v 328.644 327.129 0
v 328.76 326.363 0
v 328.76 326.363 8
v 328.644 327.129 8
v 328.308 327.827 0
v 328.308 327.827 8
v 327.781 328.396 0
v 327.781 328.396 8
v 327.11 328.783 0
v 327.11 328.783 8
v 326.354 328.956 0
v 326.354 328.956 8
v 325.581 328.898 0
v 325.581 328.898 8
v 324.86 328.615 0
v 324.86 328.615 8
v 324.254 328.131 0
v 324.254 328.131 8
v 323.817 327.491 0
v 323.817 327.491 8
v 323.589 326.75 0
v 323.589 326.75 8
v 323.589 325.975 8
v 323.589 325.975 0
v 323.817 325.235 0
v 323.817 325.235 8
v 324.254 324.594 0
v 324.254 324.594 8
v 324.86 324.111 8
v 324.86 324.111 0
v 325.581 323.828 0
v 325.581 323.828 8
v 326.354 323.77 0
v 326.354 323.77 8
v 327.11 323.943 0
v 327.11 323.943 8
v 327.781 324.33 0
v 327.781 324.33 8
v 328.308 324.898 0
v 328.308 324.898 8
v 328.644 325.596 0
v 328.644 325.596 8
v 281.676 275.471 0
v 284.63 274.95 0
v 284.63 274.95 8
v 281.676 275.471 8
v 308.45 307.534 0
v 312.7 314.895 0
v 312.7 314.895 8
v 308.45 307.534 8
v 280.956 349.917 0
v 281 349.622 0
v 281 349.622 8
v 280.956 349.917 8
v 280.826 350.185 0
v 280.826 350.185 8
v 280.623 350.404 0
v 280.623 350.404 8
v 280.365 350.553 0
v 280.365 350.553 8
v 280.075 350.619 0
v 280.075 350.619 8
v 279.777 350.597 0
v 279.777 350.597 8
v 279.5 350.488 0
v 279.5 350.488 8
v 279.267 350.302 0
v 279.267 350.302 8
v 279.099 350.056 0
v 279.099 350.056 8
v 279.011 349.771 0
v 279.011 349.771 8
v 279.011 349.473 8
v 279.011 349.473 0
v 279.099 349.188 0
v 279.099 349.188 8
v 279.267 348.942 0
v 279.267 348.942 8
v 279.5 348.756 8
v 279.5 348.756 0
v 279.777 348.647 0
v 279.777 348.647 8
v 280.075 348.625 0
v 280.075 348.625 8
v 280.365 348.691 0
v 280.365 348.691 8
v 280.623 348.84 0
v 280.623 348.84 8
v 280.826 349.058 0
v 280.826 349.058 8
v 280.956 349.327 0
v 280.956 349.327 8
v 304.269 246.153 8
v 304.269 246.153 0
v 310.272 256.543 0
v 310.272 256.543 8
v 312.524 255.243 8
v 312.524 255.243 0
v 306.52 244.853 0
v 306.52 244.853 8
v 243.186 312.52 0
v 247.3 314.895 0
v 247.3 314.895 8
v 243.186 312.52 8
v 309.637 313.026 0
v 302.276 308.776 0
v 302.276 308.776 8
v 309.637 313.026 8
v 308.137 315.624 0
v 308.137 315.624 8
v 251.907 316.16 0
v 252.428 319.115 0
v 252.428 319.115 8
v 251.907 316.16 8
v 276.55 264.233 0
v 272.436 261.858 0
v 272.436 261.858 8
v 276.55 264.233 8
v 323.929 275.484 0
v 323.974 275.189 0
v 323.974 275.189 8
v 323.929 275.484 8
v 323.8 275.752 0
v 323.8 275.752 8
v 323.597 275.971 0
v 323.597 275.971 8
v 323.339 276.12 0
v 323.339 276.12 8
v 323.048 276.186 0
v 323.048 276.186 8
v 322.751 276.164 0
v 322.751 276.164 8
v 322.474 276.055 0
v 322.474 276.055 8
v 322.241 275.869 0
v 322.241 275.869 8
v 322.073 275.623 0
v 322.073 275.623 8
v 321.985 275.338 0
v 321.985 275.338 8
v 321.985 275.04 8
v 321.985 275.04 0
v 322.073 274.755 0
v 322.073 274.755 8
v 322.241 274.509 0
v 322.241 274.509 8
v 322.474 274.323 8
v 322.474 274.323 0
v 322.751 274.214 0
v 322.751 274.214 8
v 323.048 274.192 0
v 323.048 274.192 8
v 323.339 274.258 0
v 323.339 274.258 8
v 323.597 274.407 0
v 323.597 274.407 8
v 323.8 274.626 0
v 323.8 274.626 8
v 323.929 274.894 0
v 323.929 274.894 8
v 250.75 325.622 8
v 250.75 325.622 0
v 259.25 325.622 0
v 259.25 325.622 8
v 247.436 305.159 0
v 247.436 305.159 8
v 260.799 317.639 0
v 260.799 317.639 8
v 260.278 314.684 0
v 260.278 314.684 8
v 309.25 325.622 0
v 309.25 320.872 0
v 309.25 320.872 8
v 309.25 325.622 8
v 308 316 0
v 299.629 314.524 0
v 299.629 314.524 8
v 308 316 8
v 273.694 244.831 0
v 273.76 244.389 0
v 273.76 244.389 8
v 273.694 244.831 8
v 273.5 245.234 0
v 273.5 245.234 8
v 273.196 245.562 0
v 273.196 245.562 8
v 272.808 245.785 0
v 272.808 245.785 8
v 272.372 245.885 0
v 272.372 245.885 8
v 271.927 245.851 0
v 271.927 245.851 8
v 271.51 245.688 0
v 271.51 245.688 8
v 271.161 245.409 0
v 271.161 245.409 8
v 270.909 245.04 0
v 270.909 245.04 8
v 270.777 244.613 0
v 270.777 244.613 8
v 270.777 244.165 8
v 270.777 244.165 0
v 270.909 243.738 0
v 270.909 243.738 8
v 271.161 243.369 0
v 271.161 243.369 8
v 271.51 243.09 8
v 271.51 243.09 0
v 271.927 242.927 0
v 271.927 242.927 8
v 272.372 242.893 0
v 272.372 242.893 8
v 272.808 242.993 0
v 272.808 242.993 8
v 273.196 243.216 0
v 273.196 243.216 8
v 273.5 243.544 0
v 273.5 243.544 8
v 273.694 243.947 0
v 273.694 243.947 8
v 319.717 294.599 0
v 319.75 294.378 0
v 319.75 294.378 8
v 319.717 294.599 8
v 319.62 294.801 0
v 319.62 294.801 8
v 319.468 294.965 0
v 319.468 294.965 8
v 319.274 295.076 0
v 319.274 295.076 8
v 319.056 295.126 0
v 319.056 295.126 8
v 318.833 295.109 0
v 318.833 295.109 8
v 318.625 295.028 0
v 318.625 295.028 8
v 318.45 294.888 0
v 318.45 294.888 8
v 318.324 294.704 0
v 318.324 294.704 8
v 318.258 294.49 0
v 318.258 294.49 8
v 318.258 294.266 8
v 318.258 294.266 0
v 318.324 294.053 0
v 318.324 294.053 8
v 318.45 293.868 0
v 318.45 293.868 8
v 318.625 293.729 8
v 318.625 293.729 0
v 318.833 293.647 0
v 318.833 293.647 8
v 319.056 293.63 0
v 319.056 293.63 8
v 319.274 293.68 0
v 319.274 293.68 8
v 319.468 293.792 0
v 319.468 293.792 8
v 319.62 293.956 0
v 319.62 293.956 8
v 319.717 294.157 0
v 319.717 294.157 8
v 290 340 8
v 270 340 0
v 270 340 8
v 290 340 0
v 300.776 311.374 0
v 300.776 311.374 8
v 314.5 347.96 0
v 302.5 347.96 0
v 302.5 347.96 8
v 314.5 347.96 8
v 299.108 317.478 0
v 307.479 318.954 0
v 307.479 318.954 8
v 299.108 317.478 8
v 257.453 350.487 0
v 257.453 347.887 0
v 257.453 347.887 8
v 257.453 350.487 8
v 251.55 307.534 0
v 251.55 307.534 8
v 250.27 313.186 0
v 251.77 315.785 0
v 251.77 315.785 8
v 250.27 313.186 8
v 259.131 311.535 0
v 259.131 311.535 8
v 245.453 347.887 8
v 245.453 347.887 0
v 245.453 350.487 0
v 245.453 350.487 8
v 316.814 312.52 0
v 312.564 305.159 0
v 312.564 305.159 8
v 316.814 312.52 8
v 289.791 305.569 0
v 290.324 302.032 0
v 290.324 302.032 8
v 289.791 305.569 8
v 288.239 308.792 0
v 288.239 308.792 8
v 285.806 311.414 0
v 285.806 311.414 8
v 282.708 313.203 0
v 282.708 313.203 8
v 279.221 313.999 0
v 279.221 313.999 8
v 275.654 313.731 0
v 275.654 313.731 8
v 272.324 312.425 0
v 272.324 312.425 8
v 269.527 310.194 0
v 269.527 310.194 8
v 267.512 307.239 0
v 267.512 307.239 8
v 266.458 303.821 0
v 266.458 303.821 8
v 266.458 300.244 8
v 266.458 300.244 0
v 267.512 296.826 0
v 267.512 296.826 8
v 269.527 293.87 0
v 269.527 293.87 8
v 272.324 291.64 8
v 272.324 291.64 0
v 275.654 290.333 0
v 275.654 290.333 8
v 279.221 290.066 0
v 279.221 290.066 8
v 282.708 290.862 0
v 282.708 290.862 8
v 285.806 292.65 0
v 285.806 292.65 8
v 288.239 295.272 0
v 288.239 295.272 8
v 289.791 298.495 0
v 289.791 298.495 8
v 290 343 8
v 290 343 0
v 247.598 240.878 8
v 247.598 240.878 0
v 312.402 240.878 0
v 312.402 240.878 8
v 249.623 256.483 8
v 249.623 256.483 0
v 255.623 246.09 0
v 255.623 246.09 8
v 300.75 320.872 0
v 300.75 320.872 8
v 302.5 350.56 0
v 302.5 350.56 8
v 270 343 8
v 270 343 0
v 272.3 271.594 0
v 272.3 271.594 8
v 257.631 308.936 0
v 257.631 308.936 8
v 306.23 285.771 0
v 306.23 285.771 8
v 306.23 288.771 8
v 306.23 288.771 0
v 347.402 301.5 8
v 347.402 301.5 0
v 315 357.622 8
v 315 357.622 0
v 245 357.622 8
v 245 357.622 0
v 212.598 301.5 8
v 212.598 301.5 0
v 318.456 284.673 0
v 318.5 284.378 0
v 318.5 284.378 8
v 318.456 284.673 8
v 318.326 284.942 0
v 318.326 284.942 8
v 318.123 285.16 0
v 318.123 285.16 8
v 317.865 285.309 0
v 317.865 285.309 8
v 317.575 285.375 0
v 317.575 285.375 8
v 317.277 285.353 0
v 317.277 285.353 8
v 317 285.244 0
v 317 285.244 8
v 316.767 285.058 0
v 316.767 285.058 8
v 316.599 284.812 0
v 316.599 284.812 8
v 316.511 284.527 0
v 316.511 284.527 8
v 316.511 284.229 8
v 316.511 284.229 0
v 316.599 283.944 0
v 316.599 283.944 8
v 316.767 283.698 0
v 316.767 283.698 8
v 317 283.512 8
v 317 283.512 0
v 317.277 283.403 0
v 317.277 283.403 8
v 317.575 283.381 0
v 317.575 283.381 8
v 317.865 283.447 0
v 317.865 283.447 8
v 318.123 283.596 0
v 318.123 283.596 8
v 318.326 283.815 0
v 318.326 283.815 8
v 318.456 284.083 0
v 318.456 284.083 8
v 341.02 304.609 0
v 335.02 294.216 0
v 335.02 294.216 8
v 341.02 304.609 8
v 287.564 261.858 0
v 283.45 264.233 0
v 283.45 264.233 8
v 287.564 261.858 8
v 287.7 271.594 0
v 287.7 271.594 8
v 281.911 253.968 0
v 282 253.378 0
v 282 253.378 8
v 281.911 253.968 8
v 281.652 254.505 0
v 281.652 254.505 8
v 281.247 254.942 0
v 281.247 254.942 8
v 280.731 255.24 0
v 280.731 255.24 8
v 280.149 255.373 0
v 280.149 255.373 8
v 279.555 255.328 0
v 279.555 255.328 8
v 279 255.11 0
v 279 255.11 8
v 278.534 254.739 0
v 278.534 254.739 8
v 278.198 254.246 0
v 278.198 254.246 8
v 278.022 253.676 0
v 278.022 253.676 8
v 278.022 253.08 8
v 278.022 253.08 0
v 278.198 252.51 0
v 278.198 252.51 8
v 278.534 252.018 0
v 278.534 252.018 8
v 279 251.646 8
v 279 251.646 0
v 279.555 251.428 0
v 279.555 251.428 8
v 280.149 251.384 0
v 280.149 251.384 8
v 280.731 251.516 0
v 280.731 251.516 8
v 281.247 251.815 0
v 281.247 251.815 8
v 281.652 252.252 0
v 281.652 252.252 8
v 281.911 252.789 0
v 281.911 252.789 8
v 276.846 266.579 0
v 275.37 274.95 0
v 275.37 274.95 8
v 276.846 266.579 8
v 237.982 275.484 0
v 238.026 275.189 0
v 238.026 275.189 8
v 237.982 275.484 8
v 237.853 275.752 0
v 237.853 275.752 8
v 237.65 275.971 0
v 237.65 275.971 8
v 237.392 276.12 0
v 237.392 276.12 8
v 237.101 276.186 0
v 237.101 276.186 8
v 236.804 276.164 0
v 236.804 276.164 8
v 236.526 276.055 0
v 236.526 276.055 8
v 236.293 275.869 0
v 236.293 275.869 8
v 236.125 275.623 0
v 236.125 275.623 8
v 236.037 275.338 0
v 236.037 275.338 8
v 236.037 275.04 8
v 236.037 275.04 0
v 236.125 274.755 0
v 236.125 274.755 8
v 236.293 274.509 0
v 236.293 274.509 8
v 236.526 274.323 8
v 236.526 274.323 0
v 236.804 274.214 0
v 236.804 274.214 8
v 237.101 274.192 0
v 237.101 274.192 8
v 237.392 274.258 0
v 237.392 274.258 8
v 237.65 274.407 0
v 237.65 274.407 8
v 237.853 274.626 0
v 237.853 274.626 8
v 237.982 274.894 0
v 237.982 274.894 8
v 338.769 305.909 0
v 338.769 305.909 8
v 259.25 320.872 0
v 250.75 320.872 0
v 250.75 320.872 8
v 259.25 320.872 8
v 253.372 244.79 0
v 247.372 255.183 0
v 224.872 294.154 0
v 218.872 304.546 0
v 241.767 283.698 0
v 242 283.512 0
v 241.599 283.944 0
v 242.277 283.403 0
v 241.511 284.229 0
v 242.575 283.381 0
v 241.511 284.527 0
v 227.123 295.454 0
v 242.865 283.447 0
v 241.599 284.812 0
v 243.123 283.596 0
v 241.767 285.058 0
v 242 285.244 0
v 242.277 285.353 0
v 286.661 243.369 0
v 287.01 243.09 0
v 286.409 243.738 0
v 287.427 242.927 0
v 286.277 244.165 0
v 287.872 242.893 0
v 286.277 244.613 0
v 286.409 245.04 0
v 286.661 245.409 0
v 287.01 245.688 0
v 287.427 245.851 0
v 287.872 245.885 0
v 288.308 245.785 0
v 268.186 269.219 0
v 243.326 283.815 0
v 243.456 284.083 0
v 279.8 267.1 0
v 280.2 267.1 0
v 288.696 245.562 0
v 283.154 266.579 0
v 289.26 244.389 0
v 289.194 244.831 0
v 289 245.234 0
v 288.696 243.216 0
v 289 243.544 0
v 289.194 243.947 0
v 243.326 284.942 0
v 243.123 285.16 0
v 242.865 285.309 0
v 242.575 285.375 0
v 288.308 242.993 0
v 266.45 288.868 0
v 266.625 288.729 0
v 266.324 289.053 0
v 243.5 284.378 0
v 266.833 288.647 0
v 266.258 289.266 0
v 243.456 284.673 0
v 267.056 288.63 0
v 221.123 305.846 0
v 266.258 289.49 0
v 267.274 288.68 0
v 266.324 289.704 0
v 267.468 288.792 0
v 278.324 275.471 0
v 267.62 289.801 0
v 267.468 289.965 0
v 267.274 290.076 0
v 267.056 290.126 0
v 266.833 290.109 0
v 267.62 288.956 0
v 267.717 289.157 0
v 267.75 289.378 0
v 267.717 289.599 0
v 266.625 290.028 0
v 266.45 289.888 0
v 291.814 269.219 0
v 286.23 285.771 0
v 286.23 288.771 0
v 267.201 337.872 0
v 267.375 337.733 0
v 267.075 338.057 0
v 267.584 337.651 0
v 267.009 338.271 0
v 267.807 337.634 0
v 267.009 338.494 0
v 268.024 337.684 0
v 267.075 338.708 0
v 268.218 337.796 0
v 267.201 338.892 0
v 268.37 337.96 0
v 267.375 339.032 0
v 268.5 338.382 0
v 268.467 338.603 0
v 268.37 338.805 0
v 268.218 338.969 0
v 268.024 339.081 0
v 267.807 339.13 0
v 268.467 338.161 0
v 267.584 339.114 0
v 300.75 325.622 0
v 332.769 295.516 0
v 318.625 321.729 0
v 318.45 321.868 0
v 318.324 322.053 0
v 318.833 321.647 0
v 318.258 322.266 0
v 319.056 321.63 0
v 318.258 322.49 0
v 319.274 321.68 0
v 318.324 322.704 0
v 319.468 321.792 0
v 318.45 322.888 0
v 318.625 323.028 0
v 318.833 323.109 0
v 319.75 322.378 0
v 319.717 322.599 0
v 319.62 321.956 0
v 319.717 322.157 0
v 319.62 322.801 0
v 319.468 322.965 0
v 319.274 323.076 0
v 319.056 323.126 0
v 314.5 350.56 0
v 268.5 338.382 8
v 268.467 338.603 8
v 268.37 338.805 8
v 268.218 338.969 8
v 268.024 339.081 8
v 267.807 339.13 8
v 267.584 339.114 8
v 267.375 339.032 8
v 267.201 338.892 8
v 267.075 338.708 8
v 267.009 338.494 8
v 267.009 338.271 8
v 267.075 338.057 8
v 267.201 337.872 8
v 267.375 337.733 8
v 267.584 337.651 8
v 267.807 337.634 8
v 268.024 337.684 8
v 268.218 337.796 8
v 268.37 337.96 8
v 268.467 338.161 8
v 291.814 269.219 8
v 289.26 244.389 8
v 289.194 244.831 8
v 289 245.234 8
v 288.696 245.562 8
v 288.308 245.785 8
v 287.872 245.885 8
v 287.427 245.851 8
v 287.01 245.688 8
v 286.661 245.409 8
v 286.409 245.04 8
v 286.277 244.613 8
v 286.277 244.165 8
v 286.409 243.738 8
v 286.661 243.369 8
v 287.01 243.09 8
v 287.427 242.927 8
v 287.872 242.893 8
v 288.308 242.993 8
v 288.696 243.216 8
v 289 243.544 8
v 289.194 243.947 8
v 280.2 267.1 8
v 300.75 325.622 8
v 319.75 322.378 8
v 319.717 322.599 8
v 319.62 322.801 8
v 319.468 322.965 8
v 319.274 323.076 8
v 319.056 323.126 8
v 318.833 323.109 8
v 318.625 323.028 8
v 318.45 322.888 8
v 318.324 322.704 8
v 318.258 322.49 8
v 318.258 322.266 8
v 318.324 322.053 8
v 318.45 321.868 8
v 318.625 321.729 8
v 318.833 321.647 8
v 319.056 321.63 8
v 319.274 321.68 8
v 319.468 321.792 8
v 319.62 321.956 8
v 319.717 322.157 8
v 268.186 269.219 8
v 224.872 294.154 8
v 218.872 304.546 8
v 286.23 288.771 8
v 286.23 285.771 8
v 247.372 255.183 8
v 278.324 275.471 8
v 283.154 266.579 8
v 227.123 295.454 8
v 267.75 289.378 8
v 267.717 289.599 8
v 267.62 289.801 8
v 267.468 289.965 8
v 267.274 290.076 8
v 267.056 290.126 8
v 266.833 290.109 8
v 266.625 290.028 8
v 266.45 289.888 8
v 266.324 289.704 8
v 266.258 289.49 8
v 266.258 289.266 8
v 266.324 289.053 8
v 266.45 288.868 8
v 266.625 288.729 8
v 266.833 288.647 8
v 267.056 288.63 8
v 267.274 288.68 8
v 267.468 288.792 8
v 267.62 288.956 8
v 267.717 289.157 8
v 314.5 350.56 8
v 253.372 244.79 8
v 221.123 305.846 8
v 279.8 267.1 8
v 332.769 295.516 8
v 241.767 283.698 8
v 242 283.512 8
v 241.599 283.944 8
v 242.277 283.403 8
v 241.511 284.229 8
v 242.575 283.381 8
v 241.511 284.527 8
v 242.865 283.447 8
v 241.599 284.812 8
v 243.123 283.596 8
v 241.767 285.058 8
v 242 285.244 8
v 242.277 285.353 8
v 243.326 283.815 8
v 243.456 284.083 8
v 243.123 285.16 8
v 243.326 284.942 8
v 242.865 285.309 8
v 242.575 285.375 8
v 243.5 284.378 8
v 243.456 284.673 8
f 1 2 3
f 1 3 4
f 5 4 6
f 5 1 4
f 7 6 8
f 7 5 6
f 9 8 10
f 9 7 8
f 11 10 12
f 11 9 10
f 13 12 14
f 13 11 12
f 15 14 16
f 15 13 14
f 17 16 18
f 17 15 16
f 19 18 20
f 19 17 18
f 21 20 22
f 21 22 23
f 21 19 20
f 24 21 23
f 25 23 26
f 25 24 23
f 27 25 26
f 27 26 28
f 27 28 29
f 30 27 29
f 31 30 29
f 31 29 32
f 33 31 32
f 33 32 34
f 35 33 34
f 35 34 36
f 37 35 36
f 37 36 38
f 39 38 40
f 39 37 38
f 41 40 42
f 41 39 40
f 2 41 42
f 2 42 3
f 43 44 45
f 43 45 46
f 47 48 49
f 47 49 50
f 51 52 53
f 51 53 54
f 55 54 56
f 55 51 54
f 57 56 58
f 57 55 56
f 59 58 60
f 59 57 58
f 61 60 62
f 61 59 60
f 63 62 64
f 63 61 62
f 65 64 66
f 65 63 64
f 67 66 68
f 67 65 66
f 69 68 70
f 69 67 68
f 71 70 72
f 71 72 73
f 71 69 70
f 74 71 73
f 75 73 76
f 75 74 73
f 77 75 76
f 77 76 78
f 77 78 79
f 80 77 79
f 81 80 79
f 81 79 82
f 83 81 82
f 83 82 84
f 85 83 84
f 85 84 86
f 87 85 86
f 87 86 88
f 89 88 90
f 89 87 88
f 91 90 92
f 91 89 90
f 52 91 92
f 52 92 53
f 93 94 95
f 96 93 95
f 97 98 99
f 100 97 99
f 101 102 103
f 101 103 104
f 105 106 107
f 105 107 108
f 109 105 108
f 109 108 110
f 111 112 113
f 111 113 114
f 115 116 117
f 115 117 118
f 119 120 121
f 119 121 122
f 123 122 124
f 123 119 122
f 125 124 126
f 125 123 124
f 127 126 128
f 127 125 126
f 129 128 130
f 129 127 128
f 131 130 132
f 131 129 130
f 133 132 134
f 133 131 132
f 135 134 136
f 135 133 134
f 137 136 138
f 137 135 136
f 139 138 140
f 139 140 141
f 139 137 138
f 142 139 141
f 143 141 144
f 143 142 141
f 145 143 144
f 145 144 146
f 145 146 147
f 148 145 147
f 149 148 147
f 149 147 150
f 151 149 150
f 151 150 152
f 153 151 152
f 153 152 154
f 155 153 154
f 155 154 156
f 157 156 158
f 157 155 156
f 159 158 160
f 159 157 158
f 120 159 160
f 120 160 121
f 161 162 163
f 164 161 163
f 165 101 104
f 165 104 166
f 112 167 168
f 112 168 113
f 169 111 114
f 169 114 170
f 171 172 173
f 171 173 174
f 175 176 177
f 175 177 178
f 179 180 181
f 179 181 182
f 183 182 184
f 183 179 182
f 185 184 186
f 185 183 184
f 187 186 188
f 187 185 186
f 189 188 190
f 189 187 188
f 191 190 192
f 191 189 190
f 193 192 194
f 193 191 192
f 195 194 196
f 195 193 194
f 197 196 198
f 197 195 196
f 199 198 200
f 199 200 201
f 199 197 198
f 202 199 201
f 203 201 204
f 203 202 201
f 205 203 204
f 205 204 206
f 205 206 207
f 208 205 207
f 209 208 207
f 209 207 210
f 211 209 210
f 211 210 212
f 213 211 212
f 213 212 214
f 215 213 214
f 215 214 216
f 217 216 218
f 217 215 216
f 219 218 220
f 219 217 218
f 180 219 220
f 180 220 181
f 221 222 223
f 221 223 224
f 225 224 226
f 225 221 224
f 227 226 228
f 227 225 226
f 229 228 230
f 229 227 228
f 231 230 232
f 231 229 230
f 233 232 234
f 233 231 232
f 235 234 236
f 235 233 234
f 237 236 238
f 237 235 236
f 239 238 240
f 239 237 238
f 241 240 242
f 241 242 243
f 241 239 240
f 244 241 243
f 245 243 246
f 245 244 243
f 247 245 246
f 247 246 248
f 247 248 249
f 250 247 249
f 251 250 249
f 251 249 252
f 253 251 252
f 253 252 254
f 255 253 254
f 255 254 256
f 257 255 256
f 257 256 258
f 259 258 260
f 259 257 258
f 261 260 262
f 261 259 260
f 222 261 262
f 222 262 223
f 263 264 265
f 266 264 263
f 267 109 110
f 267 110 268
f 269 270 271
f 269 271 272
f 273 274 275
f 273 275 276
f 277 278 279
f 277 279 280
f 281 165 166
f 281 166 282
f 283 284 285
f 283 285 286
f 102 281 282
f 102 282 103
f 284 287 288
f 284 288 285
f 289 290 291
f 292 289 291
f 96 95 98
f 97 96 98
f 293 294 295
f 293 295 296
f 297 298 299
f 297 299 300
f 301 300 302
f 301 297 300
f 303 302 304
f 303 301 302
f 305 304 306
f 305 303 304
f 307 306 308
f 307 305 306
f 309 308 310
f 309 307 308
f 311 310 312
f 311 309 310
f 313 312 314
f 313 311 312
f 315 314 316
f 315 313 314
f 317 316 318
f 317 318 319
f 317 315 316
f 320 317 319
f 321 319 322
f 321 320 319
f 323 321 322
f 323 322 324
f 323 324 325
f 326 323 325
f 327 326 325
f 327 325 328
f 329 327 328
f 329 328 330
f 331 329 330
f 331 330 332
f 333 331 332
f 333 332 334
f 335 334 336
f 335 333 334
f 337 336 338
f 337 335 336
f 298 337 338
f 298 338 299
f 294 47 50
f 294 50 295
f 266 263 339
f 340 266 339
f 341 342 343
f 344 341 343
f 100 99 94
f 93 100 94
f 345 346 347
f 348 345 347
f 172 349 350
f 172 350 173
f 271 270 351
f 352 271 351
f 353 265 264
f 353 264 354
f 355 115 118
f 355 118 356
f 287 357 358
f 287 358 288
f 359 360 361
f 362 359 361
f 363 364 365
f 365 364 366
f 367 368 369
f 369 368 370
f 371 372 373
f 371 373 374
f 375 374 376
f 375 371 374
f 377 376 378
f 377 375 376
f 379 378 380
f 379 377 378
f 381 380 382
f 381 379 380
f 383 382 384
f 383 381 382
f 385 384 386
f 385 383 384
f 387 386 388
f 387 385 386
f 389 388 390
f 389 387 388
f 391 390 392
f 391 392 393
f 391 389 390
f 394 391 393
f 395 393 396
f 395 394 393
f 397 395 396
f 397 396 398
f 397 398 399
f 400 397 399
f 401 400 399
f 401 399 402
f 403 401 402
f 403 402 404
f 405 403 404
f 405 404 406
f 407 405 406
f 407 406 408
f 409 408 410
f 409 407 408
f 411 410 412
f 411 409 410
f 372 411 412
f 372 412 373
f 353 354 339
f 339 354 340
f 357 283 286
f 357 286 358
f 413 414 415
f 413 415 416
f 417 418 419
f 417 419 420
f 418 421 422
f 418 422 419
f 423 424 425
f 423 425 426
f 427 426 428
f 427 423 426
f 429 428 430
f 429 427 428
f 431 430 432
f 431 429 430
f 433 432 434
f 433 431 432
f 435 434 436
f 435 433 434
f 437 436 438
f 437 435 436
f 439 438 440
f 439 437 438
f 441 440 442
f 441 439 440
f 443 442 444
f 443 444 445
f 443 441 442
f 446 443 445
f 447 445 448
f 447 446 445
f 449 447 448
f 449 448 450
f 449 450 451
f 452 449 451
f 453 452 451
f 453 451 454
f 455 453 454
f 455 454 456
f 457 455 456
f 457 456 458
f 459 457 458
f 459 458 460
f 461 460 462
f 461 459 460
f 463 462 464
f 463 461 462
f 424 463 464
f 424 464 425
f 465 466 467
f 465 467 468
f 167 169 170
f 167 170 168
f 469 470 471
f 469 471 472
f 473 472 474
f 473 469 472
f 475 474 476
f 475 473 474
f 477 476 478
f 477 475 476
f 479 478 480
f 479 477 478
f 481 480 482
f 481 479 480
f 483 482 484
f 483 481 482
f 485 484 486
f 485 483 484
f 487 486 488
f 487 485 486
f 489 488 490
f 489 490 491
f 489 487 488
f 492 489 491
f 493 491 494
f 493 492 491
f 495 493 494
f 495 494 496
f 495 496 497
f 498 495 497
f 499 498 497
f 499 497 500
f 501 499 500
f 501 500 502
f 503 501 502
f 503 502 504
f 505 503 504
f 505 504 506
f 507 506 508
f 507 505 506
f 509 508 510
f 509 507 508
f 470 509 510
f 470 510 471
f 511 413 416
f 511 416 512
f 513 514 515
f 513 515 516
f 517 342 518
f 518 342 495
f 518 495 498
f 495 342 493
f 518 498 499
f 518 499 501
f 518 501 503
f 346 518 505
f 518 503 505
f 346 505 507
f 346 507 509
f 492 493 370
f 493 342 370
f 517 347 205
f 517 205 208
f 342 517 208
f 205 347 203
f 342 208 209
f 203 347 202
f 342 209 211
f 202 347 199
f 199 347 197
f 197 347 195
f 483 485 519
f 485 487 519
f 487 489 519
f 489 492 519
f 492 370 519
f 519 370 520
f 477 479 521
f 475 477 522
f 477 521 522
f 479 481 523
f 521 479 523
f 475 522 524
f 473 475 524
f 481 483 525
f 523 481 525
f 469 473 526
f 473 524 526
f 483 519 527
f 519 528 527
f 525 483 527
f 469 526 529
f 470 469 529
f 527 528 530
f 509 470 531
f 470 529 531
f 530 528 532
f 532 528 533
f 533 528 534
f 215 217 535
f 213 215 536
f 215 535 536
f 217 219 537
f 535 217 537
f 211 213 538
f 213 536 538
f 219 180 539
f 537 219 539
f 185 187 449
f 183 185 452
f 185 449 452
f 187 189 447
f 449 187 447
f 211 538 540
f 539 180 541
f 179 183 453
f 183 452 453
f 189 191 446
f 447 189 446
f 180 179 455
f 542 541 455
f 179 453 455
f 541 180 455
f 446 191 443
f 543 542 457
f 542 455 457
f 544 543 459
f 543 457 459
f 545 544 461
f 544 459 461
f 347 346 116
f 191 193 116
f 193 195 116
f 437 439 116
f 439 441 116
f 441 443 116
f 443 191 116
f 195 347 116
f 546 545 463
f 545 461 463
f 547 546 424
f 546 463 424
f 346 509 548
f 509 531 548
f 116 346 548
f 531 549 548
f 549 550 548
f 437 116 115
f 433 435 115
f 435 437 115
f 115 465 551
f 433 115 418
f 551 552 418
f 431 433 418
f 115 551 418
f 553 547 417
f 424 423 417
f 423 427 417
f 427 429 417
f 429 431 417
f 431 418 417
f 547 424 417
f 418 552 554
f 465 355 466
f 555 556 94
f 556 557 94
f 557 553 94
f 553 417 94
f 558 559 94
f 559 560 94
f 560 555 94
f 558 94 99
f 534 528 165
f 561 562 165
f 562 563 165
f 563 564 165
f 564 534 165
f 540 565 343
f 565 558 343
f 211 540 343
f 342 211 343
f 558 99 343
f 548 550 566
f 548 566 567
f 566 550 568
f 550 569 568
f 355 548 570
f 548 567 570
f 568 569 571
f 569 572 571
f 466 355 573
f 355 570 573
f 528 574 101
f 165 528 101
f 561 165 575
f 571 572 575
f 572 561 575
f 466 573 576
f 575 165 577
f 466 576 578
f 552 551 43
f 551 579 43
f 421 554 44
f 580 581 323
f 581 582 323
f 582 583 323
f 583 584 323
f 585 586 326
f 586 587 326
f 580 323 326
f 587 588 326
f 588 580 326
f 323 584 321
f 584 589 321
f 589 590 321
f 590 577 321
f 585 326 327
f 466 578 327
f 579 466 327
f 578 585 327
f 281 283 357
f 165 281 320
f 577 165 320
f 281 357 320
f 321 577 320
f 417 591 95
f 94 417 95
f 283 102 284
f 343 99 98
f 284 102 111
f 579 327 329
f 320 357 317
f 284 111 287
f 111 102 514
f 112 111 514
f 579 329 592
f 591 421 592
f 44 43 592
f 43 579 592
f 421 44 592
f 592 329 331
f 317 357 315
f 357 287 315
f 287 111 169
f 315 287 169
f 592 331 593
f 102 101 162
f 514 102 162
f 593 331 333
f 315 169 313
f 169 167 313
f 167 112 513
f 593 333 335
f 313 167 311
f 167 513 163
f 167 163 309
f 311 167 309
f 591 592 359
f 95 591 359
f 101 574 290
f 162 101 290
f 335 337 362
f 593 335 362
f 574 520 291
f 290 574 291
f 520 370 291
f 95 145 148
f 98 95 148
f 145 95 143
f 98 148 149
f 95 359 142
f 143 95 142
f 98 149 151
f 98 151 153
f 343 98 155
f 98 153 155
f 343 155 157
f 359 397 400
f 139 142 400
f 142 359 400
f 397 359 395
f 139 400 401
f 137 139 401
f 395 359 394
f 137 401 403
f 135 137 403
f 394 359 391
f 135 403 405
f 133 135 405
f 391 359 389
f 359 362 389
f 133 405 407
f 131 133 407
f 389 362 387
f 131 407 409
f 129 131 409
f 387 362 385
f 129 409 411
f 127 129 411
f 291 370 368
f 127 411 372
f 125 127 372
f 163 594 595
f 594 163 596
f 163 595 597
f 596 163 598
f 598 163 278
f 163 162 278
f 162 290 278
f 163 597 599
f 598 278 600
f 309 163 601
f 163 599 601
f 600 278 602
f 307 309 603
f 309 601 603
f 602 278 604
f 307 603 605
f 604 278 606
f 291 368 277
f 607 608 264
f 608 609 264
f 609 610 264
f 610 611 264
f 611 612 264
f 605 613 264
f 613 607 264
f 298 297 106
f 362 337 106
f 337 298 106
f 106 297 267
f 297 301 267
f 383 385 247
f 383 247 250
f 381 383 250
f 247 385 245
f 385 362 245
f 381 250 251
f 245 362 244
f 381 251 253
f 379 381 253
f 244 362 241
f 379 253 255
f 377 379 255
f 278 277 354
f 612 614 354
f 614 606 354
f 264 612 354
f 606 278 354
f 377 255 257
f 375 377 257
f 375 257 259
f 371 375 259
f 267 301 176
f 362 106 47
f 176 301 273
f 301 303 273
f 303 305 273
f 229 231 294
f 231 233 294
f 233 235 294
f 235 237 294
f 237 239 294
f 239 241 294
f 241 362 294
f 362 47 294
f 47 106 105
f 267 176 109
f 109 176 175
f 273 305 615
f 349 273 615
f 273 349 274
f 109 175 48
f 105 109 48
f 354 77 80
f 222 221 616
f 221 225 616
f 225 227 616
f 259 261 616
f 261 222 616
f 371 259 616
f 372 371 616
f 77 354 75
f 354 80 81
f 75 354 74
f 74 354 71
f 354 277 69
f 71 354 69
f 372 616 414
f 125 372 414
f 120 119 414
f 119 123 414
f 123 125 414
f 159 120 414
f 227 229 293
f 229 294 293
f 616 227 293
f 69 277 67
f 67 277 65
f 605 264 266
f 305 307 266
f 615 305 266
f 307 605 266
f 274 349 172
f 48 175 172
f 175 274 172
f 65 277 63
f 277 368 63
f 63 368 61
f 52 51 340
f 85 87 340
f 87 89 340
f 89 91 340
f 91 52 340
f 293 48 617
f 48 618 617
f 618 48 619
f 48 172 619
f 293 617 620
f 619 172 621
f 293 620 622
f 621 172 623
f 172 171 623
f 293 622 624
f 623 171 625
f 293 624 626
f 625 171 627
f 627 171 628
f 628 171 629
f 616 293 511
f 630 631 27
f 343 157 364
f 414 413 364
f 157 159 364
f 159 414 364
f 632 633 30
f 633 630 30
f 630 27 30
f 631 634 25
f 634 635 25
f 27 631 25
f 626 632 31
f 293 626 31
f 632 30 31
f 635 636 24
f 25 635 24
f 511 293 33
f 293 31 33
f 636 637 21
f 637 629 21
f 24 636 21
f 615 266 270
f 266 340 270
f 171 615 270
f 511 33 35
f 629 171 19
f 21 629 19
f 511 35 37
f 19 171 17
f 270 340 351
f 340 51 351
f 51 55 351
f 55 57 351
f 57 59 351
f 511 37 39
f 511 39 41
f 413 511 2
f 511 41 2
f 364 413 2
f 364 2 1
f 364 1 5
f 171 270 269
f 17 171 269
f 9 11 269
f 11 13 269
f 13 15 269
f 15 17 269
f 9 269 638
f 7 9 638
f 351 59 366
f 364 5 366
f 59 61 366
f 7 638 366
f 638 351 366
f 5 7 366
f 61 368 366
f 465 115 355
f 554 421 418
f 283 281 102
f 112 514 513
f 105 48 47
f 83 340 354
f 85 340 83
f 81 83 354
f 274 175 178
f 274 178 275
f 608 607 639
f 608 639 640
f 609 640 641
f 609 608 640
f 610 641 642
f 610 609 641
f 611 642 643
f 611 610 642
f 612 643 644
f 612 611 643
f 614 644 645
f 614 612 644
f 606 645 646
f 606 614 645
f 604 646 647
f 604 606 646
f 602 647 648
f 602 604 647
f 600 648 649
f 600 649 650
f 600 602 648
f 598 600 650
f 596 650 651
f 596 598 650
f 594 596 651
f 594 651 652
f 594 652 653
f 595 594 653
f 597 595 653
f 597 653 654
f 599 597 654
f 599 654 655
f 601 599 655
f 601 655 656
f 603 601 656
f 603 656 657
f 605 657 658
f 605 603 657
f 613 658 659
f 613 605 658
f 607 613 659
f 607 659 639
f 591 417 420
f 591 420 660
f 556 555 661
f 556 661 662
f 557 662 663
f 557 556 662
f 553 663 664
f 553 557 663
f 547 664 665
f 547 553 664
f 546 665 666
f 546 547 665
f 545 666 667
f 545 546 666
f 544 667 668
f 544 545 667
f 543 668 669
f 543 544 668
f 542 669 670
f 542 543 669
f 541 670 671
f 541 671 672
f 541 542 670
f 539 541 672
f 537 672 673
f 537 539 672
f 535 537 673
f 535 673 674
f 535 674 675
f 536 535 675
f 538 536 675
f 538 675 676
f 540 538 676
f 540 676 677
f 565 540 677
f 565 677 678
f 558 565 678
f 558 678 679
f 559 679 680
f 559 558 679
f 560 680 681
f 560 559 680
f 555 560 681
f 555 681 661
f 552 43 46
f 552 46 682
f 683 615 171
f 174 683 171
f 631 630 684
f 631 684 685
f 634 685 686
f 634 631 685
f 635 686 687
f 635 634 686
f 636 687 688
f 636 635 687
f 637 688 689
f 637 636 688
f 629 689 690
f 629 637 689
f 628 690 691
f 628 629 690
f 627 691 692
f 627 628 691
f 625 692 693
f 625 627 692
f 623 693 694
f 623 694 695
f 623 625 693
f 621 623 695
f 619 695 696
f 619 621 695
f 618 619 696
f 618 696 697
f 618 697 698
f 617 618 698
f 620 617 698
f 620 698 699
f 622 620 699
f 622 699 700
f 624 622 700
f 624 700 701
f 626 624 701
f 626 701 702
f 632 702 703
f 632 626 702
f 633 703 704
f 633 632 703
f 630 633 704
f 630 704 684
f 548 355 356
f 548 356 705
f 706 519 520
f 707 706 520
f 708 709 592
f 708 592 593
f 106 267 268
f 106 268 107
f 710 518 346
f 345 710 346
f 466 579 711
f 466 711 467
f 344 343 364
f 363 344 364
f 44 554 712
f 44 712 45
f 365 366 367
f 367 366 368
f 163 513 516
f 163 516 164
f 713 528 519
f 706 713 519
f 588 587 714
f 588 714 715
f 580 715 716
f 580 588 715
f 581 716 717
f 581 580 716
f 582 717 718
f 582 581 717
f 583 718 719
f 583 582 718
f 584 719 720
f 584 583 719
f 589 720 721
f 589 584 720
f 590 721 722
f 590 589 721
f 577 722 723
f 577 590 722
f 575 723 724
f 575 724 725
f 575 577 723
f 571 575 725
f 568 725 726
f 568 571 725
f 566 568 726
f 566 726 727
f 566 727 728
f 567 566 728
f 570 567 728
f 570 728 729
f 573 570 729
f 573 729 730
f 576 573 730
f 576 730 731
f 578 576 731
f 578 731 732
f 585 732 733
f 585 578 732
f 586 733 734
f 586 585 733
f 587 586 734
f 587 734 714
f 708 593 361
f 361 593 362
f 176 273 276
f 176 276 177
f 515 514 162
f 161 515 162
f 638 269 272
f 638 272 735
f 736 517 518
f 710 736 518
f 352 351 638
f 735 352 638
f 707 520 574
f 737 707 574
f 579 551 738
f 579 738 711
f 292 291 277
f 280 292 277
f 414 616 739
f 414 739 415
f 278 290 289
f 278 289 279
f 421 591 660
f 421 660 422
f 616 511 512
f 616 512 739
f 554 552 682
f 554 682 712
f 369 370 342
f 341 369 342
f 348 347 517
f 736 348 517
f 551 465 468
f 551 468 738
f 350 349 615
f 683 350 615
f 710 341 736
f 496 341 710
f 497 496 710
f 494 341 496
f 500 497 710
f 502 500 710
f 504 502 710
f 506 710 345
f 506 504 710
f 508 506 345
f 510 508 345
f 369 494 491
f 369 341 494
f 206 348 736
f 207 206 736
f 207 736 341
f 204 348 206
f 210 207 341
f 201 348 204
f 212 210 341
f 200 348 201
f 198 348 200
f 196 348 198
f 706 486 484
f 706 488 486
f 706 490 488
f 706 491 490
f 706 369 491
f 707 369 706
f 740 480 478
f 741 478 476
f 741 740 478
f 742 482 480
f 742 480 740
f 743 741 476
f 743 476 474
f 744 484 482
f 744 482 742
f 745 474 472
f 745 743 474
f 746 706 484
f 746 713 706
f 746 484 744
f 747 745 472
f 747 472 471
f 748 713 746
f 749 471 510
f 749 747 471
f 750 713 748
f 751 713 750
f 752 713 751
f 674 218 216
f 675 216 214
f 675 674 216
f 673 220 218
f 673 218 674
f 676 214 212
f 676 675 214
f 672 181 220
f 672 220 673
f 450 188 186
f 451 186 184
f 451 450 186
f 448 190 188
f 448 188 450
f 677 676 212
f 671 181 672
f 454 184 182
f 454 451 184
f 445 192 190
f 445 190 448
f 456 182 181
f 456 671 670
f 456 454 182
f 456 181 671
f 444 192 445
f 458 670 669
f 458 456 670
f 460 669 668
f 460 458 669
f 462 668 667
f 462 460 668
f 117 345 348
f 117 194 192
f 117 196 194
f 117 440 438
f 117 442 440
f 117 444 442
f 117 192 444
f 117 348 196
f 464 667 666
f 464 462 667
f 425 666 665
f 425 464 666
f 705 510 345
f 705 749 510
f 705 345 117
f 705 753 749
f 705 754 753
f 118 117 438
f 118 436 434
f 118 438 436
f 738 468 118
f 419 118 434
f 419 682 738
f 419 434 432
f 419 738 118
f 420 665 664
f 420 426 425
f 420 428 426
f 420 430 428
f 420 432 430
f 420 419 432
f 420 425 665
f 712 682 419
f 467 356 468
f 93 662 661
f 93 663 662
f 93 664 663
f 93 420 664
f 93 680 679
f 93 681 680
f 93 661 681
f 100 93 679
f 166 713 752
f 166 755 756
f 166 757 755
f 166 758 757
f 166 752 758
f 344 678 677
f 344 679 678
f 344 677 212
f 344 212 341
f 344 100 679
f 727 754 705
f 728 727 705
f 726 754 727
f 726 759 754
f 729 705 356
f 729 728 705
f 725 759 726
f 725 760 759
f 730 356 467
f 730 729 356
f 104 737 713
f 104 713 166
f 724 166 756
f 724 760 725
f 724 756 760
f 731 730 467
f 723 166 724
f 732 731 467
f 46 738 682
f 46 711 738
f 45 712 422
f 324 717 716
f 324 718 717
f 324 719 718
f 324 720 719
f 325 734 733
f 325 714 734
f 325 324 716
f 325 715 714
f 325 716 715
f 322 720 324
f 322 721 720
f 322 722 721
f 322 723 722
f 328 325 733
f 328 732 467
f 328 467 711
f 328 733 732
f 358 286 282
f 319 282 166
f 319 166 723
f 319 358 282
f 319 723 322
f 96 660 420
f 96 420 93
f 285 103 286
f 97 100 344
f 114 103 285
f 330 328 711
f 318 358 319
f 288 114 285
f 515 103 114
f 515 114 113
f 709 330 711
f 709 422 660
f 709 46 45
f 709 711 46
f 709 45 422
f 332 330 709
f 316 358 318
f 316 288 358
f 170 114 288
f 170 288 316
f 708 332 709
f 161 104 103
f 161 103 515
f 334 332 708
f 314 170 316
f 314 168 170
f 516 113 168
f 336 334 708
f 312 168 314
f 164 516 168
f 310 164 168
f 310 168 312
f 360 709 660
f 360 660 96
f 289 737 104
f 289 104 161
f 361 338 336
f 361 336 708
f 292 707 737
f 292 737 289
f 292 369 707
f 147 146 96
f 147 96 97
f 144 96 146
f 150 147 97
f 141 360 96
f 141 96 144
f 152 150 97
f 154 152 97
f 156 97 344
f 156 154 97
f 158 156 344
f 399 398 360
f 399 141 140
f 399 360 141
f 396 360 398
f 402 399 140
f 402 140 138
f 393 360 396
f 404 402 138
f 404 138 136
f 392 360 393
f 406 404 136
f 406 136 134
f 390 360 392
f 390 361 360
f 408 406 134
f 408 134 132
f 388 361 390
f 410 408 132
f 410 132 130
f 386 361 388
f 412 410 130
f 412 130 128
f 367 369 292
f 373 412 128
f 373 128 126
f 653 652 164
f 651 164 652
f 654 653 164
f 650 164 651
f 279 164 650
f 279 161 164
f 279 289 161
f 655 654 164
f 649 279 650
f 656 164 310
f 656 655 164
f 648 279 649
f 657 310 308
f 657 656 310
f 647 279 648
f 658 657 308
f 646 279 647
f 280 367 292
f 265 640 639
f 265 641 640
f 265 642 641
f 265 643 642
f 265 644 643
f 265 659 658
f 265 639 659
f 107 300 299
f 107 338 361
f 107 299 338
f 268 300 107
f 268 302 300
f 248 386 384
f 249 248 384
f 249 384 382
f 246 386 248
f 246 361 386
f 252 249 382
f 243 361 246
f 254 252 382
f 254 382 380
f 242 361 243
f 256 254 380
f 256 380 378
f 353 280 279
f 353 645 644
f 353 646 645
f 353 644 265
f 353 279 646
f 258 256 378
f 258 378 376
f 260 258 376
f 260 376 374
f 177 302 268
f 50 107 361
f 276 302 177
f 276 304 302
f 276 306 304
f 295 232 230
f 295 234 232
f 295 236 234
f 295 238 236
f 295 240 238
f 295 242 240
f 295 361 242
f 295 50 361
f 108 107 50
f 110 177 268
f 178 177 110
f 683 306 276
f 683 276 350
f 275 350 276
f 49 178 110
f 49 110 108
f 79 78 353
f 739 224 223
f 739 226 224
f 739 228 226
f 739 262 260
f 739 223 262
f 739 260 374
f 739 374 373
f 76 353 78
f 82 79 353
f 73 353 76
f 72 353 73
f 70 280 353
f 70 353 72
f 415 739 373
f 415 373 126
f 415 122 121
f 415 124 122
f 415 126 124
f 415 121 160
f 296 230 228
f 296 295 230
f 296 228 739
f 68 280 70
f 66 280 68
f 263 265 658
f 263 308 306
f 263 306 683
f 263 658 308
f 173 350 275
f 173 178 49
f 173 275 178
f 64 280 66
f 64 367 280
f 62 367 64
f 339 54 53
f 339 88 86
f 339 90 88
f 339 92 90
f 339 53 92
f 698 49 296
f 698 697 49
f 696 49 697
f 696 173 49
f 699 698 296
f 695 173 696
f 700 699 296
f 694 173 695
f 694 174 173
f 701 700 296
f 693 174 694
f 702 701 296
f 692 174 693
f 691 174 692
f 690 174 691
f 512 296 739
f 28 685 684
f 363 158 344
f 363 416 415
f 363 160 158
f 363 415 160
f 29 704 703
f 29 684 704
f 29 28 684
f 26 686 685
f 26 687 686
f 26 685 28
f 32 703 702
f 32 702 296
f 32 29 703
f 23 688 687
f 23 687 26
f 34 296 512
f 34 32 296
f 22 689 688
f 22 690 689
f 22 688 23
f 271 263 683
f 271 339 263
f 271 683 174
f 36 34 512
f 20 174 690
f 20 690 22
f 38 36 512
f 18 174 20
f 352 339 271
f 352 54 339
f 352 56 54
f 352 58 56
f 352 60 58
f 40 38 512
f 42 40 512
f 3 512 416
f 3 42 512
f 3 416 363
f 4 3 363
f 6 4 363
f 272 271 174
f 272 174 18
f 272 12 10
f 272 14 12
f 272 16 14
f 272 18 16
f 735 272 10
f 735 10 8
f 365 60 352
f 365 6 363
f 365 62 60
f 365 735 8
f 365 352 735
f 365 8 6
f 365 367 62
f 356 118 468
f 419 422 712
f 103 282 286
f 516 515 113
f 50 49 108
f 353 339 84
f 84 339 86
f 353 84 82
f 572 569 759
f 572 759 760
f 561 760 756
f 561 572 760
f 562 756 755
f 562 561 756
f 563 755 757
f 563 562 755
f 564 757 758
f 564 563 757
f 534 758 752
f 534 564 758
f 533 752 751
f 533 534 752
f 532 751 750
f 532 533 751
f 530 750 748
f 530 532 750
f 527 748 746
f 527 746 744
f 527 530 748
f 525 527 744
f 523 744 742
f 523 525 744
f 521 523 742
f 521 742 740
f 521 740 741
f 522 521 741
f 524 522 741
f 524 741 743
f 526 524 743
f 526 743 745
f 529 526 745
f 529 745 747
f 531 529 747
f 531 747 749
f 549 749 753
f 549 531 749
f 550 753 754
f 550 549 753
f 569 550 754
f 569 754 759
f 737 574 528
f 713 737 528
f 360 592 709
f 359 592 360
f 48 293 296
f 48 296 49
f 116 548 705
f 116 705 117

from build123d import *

# Parameters (mm, degrees)
ESBO_O2_R                = 2
ESBO_O2_R_2              = 1.5
ESBO_O2_R_3              = 1
ESBO_O2_R_4              = 0.75
ESBO_O2_R_5              = 2.6
ESBO_O2_R_6              = 12
ESBO_O2_W                = 12
ESBO_O2_H                = 2.6
ESBO_O2_W_2              = 8.5
ESBO_O2_H_2              = 4.75
ESBO_O2_W_3              = 20
ESBO_O2_H_3              = 3
RESSALTO_EXTRUS_O1_DEPTH = 8


with BuildPart() as part:
    # Esboço2 → Ressalto-extrusão1 (new body)
    with BuildSketch(Plane.XY):
        Polygon((312.401923789, 240.878221735), (347.401923789, 301.5), (315, 357.621778265), (245, 357.621778265), (212.598076211, 301.5), (247.598076211, 240.878221735), align=None)
        with Locations((280, 253.378221735)):
            Circle(ESBO_O2_R, mode=Mode.SUBTRACT)
        with Locations((272.260343171, 244.388972359)):
            Circle(ESBO_O2_R_2, mode=Mode.SUBTRACT)
        with Locations((287.760343171, 244.388972359)):
            Circle(ESBO_O2_R_2, mode=Mode.SUBTRACT)
        with Locations((242.5, 284.378221735)):
            Circle(ESBO_O2_R_3, mode=Mode.SUBTRACT)
        with Locations((317.5, 284.378221735)):
            Circle(ESBO_O2_R_3, mode=Mode.SUBTRACT)
        with Locations((267.750492284, 338.382369461)):
            Circle(ESBO_O2_R_4, mode=Mode.SUBTRACT)
        with Locations((267, 289.378221735)):
            Circle(ESBO_O2_R_4, mode=Mode.SUBTRACT)
        with Locations((319, 294.378221735)):
            Circle(ESBO_O2_R_4, mode=Mode.SUBTRACT)
        with Locations((319, 322.378221735)):
            Circle(ESBO_O2_R_4, mode=Mode.SUBTRACT)
        with Locations((280, 349.621778265)):
            Circle(ESBO_O2_R_3, mode=Mode.SUBTRACT)
        with Locations((237.026279442, 275.189110868)):
            Circle(ESBO_O2_R_3, mode=Mode.SUBTRACT)
        with Locations((322.973720558, 275.189110868)):
            Circle(ESBO_O2_R_3, mode=Mode.SUBTRACT)
        with Locations((326.159646677, 326.362840761)):
            Circle(ESBO_O2_R_5, mode=Mode.SUBTRACT)
        with Locations((278.32399049, 302.032244112)):
            Circle(ESBO_O2_R_6, mode=Mode.SUBTRACT)
        with Locations((251.453146627, 349.186651246)):
            Rectangle(ESBO_O2_W, ESBO_O2_H, mode=Mode.SUBTRACT)
        with Locations((308.5, 349.259600438)):
            Rectangle(ESBO_O2_W, ESBO_O2_H, mode=Mode.SUBTRACT)
        Polygon((332.76851184, 295.516364843), (335.020177889, 294.216364843), (341.020177889, 304.608669688), (338.76851184, 305.908669688), align=None, mode=Mode.SUBTRACT)
        Polygon((310.272092192, 256.543153732), (312.523758242, 255.243153732), (306.520177889, 244.852916827), (304.26851184, 246.152916827), align=None, mode=Mode.SUBTRACT)
        Polygon((255.623234985, 246.090416827), (253.371568935, 244.790416827), (247.371568935, 255.182721672), (249.623234985, 256.482721672), align=None, mode=Mode.SUBTRACT)
        Polygon((227.123234985, 295.453864843), (224.871568935, 294.153864843), (218.871568935, 304.546169688), (221.123234985, 305.846169688), align=None, mode=Mode.SUBTRACT)
        with Locations((305, 323.246778265)):
            Rectangle(ESBO_O2_W_2, ESBO_O2_H_2, mode=Mode.SUBTRACT)
        Polygon((312.7004902, 314.895353928), (308.4504902, 307.534137996), (312.564110868, 305.159137996), (316.814110868, 312.520353928), align=None, mode=Mode.SUBTRACT)
        with Locations((255, 323.246778265)):
            Rectangle(ESBO_O2_W_2, ESBO_O2_H_2, mode=Mode.SUBTRACT)
        Polygon((251.5495098, 307.534137996), (247.2995098, 314.895353928), (243.185889132, 312.520353928), (247.435889132, 305.159137996), align=None, mode=Mode.SUBTRACT)
        Polygon((272.2995098, 271.594083739), (268.185889132, 269.219083739), (272.435889132, 261.857867807), (276.5495098, 264.232867807), align=None, mode=Mode.SUBTRACT)
        Polygon((287.7004902, 271.594083739), (283.4504902, 264.232867807), (287.564110868, 261.857867807), (291.814110868, 269.219083739), align=None, mode=Mode.SUBTRACT)
        Polygon((279.8, 267.1), (278.32399049, 275.470865901), (275.369567231, 274.949921368), (276.845576741, 266.579055467), align=None, mode=Mode.SUBTRACT)
        Polygon((281.67600951, 275.470865901), (280.2, 267.1), (283.154423259, 266.579055467), (284.630432769, 274.949921368), align=None, mode=Mode.SUBTRACT)
        Polygon((308.136808057, 315.624122952), (300.775592125, 311.374122952), (302.275592125, 308.77604674), (309.636808057, 313.02604674), align=None, mode=Mode.SUBTRACT)
        Polygon((299.629134099, 314.52399049), (308, 316), (307.479055467, 318.954423259), (299.108189566, 317.478413749), align=None, mode=Mode.SUBTRACT)
        Polygon((251.907080103, 316.160436254), (260.277946003, 314.684426744), (260.798890536, 317.638850003), (252.428024636, 319.114859513), align=None, mode=Mode.SUBTRACT)
        Polygon((259.131487977, 311.534559206), (251.770272045, 315.784559206), (250.270272045, 313.186482994), (257.631487977, 308.936482994), align=None, mode=Mode.SUBTRACT)
        with Locations((280, 341.5)):
            Rectangle(ESBO_O2_W_3, ESBO_O2_H_3, mode=Mode.SUBTRACT)
        with Locations((296.230303561, 287.270994592)):
            Rectangle(ESBO_O2_W_3, ESBO_O2_H_3, mode=Mode.SUBTRACT)
    extrude(amount=RESSALTO_EXTRUS_O1_DEPTH)


solid = part.part
